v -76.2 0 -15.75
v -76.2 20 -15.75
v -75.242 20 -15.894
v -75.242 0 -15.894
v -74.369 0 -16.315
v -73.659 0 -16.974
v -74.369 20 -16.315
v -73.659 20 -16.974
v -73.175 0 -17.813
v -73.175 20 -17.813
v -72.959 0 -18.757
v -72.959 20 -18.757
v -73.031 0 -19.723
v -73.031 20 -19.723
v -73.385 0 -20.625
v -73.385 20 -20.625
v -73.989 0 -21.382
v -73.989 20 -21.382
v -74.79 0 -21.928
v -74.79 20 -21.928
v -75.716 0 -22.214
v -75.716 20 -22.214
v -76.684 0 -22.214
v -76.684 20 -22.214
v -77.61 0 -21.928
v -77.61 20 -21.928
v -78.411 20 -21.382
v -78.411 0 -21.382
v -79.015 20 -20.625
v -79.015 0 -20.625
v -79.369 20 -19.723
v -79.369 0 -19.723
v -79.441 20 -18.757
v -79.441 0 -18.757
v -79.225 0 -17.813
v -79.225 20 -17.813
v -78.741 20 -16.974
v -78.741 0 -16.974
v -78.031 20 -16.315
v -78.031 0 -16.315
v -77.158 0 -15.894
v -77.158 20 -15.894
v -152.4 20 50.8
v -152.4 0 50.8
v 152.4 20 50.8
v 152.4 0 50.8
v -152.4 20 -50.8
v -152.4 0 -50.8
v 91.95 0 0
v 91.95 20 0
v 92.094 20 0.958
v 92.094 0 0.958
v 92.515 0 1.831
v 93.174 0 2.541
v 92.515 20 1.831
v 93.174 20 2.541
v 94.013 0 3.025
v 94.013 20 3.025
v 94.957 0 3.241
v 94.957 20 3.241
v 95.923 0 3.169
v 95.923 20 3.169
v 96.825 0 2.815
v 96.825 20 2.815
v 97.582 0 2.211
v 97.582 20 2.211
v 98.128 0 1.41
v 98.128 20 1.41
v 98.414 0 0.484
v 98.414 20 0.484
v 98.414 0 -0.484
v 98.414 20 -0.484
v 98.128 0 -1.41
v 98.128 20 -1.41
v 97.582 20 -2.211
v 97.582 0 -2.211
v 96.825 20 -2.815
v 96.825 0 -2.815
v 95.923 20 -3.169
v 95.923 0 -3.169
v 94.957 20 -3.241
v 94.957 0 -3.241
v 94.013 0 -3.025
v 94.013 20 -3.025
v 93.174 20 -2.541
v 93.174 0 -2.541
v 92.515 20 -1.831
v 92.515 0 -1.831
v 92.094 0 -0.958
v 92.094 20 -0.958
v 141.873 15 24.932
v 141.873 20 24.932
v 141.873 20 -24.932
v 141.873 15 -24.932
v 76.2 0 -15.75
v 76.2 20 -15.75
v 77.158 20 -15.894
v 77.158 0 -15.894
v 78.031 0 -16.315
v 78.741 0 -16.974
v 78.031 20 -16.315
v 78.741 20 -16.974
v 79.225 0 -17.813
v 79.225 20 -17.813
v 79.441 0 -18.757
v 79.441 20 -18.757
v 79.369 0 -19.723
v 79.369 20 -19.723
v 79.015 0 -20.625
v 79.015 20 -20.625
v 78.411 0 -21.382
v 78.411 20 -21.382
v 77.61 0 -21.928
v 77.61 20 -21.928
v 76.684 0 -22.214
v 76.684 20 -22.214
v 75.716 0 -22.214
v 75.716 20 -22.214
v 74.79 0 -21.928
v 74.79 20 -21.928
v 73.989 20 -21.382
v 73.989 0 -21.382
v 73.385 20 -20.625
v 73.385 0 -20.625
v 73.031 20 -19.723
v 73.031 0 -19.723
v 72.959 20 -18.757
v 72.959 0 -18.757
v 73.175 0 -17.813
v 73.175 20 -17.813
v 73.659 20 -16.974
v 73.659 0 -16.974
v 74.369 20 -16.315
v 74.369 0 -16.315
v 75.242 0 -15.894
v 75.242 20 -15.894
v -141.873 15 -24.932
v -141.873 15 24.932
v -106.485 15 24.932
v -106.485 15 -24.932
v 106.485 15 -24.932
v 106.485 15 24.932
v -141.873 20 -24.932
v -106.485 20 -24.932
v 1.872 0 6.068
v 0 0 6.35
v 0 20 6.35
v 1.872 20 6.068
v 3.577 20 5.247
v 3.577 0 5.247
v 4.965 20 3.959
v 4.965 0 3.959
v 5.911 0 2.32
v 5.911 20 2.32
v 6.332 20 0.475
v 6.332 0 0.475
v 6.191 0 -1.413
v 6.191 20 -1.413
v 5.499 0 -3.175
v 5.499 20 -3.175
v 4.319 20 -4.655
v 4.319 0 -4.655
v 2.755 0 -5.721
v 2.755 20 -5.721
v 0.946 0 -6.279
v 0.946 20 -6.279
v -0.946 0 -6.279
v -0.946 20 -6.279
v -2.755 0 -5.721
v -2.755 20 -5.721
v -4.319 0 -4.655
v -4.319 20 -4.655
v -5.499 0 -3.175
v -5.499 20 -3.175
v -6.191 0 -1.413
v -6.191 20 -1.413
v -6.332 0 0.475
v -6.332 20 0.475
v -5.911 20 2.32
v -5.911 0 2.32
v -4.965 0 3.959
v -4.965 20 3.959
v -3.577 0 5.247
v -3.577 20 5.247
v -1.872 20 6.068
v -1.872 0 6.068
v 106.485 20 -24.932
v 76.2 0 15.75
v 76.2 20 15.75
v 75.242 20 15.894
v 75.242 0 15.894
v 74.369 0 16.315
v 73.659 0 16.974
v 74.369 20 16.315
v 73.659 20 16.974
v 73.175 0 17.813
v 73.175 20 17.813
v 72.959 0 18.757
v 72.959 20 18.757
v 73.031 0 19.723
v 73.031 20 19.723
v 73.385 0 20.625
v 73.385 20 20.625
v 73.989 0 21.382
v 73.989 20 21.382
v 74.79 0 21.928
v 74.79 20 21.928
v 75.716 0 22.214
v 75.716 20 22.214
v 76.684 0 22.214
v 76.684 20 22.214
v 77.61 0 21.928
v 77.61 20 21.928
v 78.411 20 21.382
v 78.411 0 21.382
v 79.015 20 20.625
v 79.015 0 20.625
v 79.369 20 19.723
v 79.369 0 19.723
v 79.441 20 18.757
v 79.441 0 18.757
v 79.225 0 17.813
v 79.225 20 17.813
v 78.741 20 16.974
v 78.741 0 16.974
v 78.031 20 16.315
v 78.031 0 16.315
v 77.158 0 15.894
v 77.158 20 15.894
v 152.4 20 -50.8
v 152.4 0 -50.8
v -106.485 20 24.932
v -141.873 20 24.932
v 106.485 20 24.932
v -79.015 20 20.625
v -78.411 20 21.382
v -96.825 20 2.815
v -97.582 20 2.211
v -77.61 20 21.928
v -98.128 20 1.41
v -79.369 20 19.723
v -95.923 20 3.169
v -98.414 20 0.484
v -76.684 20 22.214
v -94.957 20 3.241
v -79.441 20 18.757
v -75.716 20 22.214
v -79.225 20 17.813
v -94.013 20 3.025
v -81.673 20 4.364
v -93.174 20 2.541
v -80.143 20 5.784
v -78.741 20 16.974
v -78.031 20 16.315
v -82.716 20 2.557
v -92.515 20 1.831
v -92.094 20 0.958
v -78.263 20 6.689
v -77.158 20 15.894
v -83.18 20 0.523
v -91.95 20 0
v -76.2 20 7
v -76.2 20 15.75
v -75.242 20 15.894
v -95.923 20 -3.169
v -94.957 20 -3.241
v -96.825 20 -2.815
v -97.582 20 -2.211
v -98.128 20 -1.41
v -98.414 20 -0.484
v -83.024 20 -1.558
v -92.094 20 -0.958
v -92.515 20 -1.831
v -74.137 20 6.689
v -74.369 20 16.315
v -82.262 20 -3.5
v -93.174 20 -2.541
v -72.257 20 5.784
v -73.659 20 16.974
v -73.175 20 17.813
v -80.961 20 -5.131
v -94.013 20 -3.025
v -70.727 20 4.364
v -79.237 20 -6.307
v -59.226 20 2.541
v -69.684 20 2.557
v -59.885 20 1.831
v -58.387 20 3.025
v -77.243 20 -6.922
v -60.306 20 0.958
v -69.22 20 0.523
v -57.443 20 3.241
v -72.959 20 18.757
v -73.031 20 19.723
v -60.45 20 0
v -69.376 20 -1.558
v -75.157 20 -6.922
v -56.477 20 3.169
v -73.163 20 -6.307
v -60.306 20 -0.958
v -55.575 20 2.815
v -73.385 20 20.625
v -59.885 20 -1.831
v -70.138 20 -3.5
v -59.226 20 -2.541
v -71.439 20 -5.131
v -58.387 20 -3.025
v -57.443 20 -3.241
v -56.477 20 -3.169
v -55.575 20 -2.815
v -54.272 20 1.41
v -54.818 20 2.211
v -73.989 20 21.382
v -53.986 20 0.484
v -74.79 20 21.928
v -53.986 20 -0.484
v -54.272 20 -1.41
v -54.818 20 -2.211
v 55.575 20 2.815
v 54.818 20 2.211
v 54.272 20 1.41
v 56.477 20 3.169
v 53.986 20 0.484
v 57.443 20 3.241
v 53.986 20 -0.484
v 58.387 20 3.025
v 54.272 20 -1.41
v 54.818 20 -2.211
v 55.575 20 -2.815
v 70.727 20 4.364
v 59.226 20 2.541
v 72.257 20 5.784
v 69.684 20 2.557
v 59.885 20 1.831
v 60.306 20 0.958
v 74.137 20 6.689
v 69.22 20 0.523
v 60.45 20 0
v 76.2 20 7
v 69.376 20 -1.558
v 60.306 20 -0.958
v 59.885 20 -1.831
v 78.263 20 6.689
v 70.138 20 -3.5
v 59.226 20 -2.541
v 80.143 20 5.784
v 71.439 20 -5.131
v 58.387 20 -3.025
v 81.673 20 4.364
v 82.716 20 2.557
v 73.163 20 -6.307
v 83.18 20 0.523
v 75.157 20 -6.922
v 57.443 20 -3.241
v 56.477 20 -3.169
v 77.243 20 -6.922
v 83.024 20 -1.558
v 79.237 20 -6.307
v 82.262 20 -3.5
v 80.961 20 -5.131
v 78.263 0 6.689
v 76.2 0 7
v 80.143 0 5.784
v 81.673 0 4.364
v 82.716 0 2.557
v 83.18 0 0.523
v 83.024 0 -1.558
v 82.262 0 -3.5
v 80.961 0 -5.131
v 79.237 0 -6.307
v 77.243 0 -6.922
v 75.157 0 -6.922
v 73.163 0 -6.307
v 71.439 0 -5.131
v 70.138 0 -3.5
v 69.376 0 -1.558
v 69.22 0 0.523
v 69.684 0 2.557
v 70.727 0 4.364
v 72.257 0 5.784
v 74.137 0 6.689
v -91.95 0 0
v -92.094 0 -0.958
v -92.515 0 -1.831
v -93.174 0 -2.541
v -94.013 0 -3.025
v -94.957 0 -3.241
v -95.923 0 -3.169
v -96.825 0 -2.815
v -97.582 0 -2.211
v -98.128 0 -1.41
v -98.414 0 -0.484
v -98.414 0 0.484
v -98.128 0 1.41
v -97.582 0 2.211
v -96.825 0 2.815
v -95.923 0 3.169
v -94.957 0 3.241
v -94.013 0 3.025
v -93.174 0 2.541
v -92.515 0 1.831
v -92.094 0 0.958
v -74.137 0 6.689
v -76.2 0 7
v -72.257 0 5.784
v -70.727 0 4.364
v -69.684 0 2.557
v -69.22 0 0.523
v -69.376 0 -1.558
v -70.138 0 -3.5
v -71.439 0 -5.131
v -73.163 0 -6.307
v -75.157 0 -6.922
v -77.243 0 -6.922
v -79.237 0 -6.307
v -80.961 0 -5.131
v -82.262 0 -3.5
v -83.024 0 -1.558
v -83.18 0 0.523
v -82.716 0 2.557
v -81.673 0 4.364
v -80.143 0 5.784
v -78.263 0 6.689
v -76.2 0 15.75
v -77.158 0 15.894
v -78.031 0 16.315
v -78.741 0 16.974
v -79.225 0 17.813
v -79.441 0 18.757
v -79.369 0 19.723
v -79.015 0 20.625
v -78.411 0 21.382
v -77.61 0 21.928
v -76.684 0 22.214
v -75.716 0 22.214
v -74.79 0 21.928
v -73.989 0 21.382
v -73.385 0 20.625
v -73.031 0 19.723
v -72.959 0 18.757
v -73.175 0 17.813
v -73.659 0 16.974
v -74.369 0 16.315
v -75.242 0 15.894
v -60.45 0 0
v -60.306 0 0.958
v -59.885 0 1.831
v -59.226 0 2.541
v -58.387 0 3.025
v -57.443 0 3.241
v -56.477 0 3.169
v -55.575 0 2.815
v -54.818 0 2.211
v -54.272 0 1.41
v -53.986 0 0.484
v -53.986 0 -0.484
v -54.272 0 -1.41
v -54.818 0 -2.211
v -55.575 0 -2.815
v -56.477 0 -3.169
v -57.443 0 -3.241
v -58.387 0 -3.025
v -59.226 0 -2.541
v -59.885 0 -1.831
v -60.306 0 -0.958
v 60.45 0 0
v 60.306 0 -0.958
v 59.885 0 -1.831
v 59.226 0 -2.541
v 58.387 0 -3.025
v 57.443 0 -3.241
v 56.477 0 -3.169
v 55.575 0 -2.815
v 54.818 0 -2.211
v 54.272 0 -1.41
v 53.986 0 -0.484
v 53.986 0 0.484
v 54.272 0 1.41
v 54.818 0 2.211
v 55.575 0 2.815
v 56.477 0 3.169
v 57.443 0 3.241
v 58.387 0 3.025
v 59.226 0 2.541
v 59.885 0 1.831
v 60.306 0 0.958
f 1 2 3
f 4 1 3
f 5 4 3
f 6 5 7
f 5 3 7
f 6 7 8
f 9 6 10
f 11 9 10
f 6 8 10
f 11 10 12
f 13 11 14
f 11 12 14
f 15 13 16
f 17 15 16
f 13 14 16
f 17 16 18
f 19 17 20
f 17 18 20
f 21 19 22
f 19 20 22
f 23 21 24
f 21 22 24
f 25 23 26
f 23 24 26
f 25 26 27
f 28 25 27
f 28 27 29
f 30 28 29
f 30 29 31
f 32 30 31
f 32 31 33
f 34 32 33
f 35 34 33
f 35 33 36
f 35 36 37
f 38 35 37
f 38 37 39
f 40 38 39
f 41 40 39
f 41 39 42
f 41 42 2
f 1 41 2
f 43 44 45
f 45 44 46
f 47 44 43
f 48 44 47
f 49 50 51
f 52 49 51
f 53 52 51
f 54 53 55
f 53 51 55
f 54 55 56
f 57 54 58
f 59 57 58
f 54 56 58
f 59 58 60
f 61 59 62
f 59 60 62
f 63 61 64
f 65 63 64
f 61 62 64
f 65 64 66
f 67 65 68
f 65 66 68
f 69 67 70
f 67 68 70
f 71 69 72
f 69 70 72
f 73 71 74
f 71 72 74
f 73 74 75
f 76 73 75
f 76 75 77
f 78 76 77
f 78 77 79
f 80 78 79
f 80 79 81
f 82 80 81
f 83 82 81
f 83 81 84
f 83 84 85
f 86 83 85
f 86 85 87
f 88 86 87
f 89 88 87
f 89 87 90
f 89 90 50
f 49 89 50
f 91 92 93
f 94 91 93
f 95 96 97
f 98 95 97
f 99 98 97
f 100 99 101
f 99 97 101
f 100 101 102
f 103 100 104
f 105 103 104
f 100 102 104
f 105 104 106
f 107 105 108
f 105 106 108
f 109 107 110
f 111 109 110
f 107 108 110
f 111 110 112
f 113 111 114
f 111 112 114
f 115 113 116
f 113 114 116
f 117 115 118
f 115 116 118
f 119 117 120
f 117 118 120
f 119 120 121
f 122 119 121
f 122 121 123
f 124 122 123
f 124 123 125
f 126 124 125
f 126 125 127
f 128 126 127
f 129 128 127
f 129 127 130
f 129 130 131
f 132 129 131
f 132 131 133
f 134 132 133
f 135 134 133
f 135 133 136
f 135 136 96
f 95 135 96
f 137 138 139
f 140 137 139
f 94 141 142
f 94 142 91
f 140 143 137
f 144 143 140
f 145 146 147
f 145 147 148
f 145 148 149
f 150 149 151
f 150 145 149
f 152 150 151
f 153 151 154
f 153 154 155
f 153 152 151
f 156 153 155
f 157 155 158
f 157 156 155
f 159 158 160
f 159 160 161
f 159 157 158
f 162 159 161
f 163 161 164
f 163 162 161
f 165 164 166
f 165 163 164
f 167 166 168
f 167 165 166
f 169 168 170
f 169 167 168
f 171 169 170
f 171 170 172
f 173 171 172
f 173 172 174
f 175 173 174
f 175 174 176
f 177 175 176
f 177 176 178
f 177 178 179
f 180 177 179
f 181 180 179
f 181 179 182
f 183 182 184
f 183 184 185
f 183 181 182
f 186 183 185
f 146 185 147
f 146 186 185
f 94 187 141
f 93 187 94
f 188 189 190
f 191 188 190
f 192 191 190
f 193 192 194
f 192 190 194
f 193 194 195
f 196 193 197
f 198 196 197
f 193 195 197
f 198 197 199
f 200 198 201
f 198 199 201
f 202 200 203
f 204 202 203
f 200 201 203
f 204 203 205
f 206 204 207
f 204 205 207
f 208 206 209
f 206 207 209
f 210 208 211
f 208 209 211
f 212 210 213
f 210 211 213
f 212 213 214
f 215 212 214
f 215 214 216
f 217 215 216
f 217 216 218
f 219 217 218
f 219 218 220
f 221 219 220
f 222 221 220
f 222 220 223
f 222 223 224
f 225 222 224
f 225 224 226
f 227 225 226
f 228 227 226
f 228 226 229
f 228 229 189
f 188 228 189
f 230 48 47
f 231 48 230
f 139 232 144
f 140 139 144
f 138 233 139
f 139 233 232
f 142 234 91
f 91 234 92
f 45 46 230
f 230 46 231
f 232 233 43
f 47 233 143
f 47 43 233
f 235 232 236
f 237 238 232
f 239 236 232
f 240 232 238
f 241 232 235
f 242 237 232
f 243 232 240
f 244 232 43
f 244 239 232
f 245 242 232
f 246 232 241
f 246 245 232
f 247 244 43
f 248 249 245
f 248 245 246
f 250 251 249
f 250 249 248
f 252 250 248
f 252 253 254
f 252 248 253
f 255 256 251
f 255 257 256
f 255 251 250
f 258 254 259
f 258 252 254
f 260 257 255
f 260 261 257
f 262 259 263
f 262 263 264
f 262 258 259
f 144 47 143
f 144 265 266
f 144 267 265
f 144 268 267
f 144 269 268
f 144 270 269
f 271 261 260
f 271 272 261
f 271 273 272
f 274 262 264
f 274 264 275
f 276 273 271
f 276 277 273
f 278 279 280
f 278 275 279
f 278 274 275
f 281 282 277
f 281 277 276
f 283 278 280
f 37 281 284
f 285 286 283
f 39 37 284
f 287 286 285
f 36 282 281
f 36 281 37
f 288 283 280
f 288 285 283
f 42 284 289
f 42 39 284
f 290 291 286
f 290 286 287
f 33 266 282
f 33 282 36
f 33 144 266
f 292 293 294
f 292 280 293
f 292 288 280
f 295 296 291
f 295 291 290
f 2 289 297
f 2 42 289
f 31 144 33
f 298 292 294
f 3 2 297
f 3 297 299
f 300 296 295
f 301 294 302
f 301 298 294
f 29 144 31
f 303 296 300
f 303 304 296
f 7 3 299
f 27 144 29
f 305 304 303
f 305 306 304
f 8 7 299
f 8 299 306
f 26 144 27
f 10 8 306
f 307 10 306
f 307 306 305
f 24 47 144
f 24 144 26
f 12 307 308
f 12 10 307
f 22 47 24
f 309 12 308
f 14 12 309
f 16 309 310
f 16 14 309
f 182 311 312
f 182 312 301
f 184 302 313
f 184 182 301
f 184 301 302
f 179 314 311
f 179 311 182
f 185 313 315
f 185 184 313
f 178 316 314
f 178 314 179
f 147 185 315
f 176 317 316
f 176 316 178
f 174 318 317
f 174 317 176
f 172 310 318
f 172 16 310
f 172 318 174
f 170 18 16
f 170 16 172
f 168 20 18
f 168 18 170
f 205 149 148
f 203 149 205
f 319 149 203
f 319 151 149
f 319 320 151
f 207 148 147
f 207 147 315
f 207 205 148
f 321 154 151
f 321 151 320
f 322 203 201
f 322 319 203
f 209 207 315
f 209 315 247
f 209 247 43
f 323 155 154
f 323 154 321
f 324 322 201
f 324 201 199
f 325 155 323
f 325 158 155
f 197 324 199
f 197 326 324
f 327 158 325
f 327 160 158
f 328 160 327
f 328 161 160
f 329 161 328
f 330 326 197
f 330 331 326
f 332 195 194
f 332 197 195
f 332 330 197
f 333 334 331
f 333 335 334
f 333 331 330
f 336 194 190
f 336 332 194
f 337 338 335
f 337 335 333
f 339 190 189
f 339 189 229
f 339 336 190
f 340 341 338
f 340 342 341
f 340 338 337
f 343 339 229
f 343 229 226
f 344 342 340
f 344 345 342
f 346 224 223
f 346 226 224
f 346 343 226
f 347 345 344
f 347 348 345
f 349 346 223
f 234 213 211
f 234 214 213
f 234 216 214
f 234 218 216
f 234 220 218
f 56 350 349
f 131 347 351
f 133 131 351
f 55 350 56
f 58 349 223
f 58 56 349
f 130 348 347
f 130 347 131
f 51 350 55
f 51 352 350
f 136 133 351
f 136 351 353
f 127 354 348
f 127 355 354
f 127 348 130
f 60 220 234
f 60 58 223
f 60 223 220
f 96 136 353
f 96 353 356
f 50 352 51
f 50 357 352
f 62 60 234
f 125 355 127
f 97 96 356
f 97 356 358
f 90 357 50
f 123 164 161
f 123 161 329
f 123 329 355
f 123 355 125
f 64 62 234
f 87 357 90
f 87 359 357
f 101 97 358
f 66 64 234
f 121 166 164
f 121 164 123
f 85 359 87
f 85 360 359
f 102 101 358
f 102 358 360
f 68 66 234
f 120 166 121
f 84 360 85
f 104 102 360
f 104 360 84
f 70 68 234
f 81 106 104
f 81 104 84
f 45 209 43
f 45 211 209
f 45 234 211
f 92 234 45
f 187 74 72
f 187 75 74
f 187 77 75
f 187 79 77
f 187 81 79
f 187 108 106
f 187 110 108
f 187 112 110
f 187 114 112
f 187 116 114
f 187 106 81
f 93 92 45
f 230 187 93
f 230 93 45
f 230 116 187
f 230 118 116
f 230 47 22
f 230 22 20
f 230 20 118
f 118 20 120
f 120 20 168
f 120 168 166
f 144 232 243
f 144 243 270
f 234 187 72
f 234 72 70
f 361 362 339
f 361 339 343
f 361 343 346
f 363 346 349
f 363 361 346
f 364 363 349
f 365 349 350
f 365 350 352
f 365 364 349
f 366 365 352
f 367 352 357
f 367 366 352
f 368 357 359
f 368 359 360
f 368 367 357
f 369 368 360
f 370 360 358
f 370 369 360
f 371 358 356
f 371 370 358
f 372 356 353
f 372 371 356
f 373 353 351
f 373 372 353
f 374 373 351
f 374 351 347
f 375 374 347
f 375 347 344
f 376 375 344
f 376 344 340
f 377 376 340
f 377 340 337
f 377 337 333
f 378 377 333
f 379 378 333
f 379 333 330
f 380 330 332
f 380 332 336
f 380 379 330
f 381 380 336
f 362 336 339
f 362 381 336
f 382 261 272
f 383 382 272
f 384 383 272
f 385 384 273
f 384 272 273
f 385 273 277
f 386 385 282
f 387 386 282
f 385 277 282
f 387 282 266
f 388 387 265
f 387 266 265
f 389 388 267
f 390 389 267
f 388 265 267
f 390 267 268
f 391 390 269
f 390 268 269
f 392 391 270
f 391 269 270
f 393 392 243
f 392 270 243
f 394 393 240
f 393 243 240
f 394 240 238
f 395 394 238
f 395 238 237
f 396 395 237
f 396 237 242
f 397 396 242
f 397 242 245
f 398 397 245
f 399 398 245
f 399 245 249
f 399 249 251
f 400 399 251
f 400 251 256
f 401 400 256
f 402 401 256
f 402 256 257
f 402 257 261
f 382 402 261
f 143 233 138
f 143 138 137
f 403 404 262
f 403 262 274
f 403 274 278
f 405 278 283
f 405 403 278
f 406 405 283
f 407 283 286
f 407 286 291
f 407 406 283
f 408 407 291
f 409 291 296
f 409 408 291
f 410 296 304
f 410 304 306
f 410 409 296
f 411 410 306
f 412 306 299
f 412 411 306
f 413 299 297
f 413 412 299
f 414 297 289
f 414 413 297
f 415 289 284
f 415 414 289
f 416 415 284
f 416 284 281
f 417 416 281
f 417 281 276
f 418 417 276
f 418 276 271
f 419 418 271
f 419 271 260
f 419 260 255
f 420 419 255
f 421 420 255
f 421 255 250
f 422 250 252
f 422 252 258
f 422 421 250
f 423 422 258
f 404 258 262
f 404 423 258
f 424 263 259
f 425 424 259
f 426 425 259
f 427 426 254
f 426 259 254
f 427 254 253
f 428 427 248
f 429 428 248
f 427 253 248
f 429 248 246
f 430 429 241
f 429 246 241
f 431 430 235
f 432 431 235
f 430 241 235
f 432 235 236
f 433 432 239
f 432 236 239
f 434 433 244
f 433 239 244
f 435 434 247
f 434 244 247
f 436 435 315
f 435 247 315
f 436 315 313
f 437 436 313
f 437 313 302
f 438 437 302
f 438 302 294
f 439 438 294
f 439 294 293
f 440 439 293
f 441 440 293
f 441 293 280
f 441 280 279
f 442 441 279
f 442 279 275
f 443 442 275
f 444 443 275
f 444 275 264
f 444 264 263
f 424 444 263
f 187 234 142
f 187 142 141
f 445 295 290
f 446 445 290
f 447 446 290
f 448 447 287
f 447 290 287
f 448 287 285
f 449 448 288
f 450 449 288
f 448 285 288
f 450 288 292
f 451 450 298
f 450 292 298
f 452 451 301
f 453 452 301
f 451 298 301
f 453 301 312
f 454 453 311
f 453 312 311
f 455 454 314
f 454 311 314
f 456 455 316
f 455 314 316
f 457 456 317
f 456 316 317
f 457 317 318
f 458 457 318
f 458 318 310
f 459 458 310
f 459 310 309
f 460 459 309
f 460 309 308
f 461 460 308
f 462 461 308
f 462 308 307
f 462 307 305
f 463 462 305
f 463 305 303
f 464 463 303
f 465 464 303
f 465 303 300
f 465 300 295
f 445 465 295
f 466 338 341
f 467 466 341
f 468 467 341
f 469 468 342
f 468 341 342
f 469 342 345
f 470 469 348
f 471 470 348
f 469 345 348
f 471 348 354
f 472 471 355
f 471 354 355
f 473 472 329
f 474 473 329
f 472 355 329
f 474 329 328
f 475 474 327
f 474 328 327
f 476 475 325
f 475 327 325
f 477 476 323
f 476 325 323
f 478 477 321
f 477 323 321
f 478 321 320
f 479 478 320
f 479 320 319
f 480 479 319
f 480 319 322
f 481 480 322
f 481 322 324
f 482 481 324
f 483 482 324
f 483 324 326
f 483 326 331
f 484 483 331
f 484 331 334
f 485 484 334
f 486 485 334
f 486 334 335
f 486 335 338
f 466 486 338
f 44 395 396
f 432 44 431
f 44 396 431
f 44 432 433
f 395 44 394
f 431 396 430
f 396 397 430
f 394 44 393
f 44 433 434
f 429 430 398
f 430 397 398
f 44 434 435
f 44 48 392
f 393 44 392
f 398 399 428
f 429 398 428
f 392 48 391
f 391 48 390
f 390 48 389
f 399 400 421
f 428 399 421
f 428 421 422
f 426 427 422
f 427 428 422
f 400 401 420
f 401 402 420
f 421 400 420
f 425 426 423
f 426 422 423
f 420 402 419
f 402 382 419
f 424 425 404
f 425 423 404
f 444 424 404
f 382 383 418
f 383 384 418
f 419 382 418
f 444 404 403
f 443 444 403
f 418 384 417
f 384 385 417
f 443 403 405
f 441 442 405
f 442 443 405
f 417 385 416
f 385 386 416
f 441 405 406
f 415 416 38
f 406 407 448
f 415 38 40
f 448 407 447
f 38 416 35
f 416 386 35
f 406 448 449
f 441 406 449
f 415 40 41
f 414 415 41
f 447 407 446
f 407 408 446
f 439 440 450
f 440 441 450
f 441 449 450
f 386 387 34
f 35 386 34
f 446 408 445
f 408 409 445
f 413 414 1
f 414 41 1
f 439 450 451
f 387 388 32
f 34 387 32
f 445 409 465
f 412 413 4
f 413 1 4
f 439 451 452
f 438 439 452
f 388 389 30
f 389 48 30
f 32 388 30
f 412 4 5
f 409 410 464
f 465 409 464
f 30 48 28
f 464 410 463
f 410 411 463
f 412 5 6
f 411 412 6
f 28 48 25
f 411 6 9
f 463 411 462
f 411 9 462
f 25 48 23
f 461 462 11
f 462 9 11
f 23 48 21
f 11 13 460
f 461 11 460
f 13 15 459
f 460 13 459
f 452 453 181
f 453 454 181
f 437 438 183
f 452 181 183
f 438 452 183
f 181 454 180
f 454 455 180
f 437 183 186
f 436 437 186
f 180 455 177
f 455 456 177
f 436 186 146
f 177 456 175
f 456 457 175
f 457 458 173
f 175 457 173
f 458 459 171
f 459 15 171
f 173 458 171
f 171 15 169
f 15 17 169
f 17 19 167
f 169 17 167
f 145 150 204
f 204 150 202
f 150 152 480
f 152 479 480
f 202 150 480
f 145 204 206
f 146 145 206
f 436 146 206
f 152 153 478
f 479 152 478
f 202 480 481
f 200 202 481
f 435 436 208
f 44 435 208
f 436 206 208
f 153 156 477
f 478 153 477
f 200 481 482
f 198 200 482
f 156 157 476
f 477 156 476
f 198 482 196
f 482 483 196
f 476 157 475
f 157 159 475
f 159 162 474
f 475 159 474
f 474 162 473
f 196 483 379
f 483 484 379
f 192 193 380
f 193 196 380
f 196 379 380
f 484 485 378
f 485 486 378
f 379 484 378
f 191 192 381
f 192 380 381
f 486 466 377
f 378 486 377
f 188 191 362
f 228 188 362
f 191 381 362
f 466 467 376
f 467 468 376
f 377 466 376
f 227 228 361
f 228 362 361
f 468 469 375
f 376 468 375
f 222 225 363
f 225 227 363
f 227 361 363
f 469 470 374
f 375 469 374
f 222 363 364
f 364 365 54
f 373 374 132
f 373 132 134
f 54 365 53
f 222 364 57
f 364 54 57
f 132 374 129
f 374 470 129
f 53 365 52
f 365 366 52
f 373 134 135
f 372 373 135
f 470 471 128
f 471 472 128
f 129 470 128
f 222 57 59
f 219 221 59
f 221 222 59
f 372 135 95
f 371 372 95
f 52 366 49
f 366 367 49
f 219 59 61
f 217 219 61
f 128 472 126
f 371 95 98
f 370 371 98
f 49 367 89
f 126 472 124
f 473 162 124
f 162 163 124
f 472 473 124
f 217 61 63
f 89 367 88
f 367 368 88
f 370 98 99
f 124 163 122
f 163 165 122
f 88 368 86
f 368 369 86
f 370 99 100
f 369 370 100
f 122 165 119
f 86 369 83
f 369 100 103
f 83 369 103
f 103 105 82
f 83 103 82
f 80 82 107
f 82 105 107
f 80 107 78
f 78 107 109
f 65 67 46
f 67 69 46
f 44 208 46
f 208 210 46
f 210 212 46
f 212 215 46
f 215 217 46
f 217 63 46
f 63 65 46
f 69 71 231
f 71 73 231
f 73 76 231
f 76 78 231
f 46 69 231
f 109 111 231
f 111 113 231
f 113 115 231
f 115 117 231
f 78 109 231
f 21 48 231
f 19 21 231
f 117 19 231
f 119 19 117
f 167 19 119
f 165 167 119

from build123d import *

# Parameters (mm, degrees)
SKETCH2_W                 = 304.8
SKETCH2_H                 = 101.6
SKETCH2_R                 = 6.35
SKETCH2_R_2               = 7
BOSS_EXTRUDE1_DEPTH       = 20
SKETCH3_R                 = 3.25
CUT_EXTRUDE1_DEPTH        = 162.883909021
CIRPATTERN1_COUNT         = 4
LPATTERN1_COUNT           = 2
LPATTERN1_PITCH           = 152.4
LPATTERN1_COPY_1_SKETCH_R = 3.25
LPATTERN1_COPY_1_DEPTH    = 162.883909021
LPATTERN1_COPY_2_SKETCH_R = 3.25
LPATTERN1_COPY_2_DEPTH    = 162.883909021
LPATTERN1_COPY_3_SKETCH_R = 3.25
LPATTERN1_COPY_3_DEPTH    = 162.883909021
SKETCH4_W                 = 35.387760229
SKETCH4_H                 = 49.864571232
CUT_EXTRUDE2_DEPTH        = 5


with BuildPart() as part:
    # Sketch2 → Boss-Extrude1 (new body)
    with BuildSketch(Plane(origin=(0, 0, 0), x_dir=(1, 0, 0), z_dir=(0, 1, 0))):
        Rectangle(SKETCH2_W, SKETCH2_H)
        with Locations(Location((0, 0, 0), (0, 0, 270))):
            Circle(SKETCH2_R, mode=Mode.SUBTRACT)
        with Locations(Location((-76.2, 0, 0), (0, 0, 270))):
            Circle(SKETCH2_R_2, mode=Mode.SUBTRACT)
        with Locations(Location((76.2, 0, 0), (0, 0, 270))):
            Circle(SKETCH2_R_2, mode=Mode.SUBTRACT)
    extrude(amount=BOSS_EXTRUDE1_DEPTH)

    # Sketch3 → Cut-Extrude1 (cut, through all)
    with BuildSketch(Plane(origin=(0, 20, 0), x_dir=(1, 0, 0), z_dir=(0, 1, 0))):
        with Locations(Location((-76.2, 19, 0), (0, 0, 270))):
            Circle(SKETCH3_R)
    cut_extrude1 = extrude(amount=-CUT_EXTRUDE1_DEPTH, mode=Mode.SUBTRACT)

    # CirPattern1: Cut-Extrude1 ×4 about axis
    cirpattern1_axis = Axis((-76.2, 0, 0), (0, 1, 0))
    for i in range(1, CIRPATTERN1_COUNT):
        add(cut_extrude1.rotate(cirpattern1_axis, i * 360 / CIRPATTERN1_COUNT), mode=Mode.SUBTRACT)

    # LPattern1: Cut-Extrude1 ×2
    with Locations(*[(i * LPATTERN1_PITCH, 0, 0) for i in range(1, LPATTERN1_COUNT)]):
        add(cut_extrude1, mode=Mode.SUBTRACT)

    # LPattern1 copy 1 sketch → LPattern1 copy 1 (cut, through all)
    with BuildSketch(Plane(origin=(76.2, 20, -76.2), x_dir=(0, 0, -1), z_dir=(0, 1, 0))):
        with Locations(Location((-76.2, 19, 0), (0, 0, 270))):
            Circle(LPATTERN1_COPY_1_SKETCH_R)
    extrude(amount=-LPATTERN1_COPY_1_DEPTH, mode=Mode.SUBTRACT)

    # LPattern1 copy 2 sketch → LPattern1 copy 2 (cut, through all)
    with BuildSketch(Plane(origin=(0, 20, 0), x_dir=(-1, 0, 0), z_dir=(0, 1, 0))):
        with Locations(Location((-76.2, 19, 0), (0, 0, 270))):
            Circle(LPATTERN1_COPY_2_SKETCH_R)
    extrude(amount=-LPATTERN1_COPY_2_DEPTH, mode=Mode.SUBTRACT)

    # LPattern1 copy 3 sketch → LPattern1 copy 3 (cut, through all)
    with BuildSketch(Plane(origin=(76.2, 20, 76.2), x_dir=(0, 0, 1), z_dir=(0, 1, 0))):
        with Locations(Location((-76.2, 19, 0), (0, 0, 270))):
            Circle(LPATTERN1_COPY_3_SKETCH_R)
    extrude(amount=-LPATTERN1_COPY_3_DEPTH, mode=Mode.SUBTRACT)

    # Sketch4 → Cut-Extrude2 (cut)
    with BuildSketch(Plane(origin=(0, 20, 0), x_dir=(1, 0, 0), z_dir=(0, 1, 0))):
        with Locations((-124.178867714, 0)):
            Rectangle(SKETCH4_W, SKETCH4_H)
        with Locations((124.178867714, 0)):
            Rectangle(SKETCH4_W, SKETCH4_H)
    extrude(amount=-CUT_EXTRUDE2_DEPTH, mode=Mode.SUBTRACT)


solid = part.part
